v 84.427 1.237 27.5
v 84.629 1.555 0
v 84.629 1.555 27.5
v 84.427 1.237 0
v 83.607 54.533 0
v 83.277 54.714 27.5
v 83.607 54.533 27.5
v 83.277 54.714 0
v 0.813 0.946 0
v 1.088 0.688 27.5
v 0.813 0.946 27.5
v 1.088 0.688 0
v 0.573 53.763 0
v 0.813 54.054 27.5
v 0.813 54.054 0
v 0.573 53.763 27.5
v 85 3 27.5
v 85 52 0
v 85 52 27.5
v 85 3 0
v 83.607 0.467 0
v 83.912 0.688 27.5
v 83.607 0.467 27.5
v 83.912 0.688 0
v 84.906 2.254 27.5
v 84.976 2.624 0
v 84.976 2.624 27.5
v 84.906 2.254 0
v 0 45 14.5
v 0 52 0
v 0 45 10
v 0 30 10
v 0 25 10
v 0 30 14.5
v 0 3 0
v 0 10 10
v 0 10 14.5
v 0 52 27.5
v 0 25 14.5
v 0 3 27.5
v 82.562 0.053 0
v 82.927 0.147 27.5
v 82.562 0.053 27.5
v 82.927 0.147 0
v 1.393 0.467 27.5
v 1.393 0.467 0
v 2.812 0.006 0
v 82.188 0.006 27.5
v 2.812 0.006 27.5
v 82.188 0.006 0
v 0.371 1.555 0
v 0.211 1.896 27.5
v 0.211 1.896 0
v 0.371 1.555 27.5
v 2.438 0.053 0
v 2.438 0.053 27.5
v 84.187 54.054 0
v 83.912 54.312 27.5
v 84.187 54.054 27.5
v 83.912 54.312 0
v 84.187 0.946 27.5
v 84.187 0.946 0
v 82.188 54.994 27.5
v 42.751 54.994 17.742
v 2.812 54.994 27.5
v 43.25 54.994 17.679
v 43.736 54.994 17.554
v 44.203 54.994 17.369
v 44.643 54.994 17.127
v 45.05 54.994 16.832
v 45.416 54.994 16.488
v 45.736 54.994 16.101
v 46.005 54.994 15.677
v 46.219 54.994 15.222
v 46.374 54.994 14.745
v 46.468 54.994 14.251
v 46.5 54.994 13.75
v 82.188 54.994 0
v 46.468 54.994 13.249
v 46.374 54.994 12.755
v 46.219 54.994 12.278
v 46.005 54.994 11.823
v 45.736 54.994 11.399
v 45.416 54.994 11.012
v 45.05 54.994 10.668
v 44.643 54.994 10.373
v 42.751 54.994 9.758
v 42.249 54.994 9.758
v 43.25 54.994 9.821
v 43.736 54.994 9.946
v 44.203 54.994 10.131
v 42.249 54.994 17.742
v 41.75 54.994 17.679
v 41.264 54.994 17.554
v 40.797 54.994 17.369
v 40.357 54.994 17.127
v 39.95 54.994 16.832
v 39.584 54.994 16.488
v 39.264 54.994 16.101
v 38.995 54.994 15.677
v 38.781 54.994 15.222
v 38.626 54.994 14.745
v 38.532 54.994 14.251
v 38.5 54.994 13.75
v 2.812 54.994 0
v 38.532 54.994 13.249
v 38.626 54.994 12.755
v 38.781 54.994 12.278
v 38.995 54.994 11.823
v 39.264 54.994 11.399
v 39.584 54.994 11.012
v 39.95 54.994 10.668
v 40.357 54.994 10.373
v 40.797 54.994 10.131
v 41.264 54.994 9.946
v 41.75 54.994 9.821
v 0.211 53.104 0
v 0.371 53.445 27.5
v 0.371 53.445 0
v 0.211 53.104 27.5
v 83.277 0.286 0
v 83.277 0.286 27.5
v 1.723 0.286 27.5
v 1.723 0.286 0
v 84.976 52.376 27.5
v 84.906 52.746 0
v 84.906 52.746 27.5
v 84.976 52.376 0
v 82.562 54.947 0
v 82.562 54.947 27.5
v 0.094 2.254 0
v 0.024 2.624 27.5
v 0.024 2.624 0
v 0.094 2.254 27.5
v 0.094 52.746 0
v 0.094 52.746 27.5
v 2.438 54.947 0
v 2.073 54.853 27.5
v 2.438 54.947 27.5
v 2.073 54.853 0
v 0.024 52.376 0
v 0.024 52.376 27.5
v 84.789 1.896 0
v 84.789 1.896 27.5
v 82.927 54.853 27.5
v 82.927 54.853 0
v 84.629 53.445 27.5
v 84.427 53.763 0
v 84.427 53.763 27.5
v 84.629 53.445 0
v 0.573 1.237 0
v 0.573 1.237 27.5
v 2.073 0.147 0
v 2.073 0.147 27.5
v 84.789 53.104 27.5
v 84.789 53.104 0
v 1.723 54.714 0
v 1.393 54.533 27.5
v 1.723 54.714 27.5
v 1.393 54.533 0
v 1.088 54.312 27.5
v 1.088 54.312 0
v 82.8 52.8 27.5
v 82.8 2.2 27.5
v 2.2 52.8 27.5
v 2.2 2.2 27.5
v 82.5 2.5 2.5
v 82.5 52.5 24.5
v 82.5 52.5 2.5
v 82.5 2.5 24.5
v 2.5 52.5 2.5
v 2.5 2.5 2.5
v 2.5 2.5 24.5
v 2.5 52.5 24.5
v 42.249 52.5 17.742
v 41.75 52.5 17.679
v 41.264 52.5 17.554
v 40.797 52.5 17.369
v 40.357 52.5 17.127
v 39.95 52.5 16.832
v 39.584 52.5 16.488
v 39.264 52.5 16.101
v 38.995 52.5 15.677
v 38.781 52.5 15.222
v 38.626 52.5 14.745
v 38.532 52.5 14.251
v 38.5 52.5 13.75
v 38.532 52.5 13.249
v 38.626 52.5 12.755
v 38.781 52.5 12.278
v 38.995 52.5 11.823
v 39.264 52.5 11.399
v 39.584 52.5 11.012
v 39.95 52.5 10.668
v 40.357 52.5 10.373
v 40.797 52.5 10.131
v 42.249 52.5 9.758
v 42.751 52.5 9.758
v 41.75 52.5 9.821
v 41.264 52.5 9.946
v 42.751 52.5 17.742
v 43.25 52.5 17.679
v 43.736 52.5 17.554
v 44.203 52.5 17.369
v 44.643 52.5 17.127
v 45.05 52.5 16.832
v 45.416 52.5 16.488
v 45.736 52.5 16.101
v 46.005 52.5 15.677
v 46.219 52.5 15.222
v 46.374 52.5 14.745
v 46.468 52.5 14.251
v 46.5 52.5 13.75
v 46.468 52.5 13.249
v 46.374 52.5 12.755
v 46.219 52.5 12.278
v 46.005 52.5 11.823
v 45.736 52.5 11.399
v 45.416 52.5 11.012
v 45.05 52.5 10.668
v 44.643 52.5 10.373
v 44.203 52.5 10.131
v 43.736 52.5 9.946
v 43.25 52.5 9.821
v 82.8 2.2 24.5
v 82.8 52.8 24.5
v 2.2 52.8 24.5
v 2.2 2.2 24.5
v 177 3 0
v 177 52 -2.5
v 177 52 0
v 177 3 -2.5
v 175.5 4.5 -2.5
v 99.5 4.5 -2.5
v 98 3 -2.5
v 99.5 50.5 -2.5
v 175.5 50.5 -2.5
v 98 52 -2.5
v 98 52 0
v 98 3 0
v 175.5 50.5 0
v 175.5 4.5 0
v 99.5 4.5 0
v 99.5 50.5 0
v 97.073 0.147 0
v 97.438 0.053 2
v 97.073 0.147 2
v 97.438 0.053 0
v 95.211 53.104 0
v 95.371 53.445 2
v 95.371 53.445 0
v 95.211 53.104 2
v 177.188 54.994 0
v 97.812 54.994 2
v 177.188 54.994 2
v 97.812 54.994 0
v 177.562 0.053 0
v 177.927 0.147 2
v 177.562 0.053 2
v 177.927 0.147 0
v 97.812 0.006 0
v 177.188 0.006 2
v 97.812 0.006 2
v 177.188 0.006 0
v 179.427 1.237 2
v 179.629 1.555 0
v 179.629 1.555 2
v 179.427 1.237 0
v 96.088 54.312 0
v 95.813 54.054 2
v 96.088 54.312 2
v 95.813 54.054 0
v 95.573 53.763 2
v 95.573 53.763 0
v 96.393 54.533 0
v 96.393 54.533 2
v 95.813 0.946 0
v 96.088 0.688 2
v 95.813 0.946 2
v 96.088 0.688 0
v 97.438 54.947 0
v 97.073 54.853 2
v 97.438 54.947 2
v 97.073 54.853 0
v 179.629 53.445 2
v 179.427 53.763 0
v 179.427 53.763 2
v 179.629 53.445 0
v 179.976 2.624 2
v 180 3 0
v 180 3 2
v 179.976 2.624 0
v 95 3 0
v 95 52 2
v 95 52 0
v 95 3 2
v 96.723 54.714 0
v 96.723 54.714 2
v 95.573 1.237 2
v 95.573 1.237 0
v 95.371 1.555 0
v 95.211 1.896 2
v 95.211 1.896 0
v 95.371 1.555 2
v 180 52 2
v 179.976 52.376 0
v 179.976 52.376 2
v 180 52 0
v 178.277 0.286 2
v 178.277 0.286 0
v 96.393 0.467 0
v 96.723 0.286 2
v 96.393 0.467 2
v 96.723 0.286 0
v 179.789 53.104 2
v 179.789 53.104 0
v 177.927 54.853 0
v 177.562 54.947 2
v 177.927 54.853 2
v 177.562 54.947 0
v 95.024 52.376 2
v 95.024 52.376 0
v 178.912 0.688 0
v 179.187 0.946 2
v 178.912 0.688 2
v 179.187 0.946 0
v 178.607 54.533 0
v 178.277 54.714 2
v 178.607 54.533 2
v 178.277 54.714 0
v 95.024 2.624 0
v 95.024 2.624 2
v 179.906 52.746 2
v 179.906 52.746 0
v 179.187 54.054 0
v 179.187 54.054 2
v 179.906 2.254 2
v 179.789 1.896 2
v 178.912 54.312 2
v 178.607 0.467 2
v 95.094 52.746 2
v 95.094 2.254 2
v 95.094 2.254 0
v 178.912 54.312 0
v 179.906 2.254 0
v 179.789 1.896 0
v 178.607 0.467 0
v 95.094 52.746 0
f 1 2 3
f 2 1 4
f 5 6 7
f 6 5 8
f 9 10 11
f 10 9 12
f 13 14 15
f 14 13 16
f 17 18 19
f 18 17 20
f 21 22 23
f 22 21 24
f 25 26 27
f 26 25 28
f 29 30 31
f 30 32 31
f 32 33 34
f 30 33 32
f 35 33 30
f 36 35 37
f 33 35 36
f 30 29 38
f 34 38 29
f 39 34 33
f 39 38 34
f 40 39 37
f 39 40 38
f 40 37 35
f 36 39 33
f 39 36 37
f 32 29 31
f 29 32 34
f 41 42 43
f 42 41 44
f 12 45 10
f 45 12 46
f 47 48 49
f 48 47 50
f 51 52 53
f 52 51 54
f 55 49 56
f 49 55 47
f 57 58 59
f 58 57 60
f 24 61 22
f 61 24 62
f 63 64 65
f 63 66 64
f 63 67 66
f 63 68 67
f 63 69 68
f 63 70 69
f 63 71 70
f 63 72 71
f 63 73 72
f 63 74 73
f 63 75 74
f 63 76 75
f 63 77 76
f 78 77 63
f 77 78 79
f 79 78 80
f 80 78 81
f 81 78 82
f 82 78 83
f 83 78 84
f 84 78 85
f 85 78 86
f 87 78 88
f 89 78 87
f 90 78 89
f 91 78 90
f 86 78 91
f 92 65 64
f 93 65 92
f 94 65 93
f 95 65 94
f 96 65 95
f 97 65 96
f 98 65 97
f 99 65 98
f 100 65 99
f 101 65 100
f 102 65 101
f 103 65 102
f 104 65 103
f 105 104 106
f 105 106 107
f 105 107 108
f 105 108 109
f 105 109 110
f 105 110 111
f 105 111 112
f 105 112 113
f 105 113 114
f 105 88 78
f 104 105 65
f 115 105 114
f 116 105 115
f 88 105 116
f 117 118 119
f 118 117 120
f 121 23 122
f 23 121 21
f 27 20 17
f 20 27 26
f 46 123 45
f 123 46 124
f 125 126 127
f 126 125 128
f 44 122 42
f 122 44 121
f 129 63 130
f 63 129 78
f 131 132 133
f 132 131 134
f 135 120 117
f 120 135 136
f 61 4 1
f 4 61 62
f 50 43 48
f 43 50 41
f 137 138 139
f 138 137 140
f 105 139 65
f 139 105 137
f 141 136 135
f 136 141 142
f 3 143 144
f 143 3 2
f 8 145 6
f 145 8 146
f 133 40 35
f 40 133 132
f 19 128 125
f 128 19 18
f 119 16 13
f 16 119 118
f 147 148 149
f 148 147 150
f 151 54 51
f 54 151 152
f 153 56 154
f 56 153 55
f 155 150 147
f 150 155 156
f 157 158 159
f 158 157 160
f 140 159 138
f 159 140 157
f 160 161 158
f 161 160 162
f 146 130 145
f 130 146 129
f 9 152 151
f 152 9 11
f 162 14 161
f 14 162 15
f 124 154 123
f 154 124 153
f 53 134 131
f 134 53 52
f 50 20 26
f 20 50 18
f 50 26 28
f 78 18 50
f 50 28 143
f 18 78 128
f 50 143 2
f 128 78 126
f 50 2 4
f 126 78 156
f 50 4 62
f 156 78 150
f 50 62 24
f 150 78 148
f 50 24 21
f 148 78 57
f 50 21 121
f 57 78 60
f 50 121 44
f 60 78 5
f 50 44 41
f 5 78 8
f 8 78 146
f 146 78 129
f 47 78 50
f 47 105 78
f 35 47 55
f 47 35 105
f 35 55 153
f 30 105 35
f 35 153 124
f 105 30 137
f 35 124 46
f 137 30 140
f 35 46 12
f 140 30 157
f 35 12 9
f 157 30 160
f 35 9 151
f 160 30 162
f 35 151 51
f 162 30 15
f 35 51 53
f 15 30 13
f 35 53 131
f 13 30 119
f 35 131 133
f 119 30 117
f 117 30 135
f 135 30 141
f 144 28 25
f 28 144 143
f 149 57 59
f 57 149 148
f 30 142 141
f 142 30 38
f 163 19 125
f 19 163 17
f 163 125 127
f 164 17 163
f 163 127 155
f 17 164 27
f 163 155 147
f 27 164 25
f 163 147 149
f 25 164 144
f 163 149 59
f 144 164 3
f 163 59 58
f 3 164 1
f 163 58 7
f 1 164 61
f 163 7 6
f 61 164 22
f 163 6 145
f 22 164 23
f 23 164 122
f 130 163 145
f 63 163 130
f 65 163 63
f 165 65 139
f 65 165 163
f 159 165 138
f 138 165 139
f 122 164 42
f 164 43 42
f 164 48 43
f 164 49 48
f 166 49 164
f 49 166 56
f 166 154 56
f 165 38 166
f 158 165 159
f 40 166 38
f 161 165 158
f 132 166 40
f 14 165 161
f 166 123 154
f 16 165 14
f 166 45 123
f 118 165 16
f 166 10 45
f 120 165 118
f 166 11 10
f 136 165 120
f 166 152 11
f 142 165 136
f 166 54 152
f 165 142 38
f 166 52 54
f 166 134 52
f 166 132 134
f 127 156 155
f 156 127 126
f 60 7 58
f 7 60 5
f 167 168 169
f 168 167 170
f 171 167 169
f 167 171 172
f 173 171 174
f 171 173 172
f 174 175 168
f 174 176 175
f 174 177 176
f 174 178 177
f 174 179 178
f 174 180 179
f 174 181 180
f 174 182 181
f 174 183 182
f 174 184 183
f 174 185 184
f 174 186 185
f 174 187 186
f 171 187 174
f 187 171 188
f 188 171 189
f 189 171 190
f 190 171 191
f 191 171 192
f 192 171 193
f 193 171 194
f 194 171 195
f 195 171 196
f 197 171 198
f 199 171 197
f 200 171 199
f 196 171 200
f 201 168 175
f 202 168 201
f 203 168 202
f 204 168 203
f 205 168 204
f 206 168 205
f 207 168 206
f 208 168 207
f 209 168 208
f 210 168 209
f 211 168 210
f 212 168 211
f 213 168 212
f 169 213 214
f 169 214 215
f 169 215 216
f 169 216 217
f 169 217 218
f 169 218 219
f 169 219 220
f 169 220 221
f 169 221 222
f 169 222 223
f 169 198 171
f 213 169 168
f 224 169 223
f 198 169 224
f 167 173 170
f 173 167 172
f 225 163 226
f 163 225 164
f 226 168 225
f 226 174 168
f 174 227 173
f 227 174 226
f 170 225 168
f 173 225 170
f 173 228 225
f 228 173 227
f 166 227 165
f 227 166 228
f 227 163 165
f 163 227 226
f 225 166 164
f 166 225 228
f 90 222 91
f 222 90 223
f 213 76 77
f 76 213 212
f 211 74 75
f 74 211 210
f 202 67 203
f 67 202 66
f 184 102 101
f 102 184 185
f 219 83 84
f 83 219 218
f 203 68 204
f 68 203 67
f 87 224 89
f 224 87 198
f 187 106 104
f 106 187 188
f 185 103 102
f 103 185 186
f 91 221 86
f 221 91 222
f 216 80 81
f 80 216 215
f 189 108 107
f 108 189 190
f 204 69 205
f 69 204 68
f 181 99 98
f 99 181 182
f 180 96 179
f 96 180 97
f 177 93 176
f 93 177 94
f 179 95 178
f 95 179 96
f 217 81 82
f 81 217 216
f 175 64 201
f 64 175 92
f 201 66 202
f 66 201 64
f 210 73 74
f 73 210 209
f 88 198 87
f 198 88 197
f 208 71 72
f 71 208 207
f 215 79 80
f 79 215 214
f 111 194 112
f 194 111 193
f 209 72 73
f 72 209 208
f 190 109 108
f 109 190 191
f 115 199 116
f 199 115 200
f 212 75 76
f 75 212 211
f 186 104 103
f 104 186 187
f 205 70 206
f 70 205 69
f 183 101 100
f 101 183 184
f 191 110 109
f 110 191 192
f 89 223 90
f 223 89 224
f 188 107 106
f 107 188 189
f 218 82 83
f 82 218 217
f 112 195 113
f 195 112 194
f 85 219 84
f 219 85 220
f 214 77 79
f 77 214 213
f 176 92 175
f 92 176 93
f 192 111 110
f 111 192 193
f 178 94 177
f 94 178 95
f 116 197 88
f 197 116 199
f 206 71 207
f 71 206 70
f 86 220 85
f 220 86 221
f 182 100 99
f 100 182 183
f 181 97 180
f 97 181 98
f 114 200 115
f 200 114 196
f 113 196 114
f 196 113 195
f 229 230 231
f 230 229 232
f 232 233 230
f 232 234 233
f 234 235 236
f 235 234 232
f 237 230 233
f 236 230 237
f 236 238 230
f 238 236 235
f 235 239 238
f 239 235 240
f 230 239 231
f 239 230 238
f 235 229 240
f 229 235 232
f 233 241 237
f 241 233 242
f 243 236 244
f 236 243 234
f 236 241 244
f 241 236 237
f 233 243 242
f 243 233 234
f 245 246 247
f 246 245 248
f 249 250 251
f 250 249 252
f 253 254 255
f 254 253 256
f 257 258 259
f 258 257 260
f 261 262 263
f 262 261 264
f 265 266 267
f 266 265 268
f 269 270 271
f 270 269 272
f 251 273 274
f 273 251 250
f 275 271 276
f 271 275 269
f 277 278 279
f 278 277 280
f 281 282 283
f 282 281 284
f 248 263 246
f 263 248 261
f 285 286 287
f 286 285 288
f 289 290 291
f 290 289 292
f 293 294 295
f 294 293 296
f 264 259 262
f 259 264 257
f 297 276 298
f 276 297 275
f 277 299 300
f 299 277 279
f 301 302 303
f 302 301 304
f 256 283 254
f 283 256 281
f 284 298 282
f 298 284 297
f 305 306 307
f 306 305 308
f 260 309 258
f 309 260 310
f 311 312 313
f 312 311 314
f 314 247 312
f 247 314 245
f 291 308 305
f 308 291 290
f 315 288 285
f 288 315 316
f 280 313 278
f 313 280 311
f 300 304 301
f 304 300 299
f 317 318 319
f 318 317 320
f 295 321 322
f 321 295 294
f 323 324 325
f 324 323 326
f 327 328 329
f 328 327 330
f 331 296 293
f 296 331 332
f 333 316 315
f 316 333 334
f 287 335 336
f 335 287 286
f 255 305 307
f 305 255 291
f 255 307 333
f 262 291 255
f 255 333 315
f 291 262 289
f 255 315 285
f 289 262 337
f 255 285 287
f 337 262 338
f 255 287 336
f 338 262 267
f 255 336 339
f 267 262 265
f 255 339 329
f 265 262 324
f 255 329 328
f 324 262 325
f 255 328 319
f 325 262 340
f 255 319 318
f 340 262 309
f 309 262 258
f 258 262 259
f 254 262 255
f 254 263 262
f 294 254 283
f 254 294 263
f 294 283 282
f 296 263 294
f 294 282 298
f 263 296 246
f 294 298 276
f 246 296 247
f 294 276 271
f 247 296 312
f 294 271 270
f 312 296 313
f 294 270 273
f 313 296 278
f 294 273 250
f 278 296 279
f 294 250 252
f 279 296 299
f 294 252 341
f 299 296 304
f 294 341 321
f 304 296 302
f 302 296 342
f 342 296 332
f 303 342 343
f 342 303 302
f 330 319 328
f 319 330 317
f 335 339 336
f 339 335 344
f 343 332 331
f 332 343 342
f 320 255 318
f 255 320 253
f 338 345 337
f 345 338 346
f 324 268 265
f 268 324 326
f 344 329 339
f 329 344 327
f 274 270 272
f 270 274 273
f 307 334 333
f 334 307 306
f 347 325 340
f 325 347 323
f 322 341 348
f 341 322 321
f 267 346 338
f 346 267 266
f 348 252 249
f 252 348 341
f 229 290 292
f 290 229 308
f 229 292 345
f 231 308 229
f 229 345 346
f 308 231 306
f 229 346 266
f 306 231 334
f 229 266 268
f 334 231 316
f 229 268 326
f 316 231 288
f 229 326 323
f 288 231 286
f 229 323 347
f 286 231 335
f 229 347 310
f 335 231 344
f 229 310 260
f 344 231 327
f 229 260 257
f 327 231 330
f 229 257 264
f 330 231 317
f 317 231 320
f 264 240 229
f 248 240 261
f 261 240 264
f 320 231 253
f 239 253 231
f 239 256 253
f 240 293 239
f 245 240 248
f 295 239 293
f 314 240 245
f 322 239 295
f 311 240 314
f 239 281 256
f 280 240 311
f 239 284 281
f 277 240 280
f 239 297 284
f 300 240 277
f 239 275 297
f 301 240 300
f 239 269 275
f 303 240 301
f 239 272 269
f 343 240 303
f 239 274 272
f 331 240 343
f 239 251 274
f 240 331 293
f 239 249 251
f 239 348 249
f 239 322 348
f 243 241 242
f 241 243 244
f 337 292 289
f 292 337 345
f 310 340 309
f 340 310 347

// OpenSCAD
/*
 * Basic Electronics Enclosure Template
 * OpenSCAD Parametric Design
 * 
 * Instructions:
 * 1. Modify parameters in the CONFIGURATION section
 * 2. Preview with F5
 * 3. Render with F6 (takes longer but needed for export)
 * 4. Export STL with File -> Export -> Export as STL
 */

// =============================================================================
// CONFIGURATION - Modify these values
// =============================================================================

// Interior dimensions (mm)
interior_width = 80;
interior_depth = 50;
interior_height = 25;

// Wall parameters
wall_thickness = 2.5;
bottom_thickness = 2.5;
corner_radius = 3;

// Lid parameters
lid_thickness = 2;
lid_tolerance = 0.3;  // Gap for fit
lid_lip_height = 3;

// Quality (higher = smoother, slower)
$fn = 50;

// =============================================================================
// CALCULATED VALUES
// =============================================================================

outer_width = interior_width + 2 * wall_thickness;
outer_depth = interior_depth + 2 * wall_thickness;
outer_height = interior_height + bottom_thickness;

// =============================================================================
// MODULES
// =============================================================================

module rounded_box(w, d, h, r) {
    // Box with rounded vertical edges
    minkowski() {
        cube([w - 2*r, d - 2*r, h/2]);
        cylinder(r=r, h=h/2);
    }
}

module base() {
    difference() {
        // Outer shell
        translate([corner_radius, corner_radius, 0])
            rounded_box(outer_width, outer_depth, outer_height, corner_radius);
        
        // Interior cavity
        translate([wall_thickness, wall_thickness, bottom_thickness])
            cube([interior_width, interior_depth, interior_height + 1]);
        
        // Lid recess
        translate([wall_thickness - lid_tolerance, 
                   wall_thickness - lid_tolerance, 
                   outer_height - lid_lip_height])
            cube([interior_width + 2*lid_tolerance, 
                  interior_depth + 2*lid_tolerance, 
                  lid_lip_height + 1]);
    }
}

module lid() {
    lip_width = interior_width - 1;
    lip_depth = interior_depth - 1;
    
    union() {
        // Top plate
        translate([corner_radius, corner_radius, 0])
            rounded_box(outer_width, outer_depth, lid_thickness, corner_radius);
        
        // Inner lip
        translate([wall_thickness + 0.5, wall_thickness + 0.5, -lid_lip_height + 0.5])
            difference() {
                cube([lip_width, lip_depth, lid_lip_height]);
                translate([1.5, 1.5, -0.1])
                    cube([lip_width - 3, lip_depth - 3, lid_lip_height + 1]);
            }
    }
}

module standoff(x, y, height=5, outer_d=6, inner_d=2.5) {
    // PCB mounting standoff
    translate([wall_thickness + x, wall_thickness + y, bottom_thickness])
        difference() {
            cylinder(d=outer_d, h=height);
            translate([0, 0, -0.1])
                cylinder(d=inner_d, h=height + 1);
        }
}

module vent_slot(x, y, z, length=15, width=2) {
    // Horizontal ventilation slot
    translate([x, y, z])
        hull() {
            cylinder(d=width, h=wall_thickness + 2);
            translate([0, length, 0])
                cylinder(d=width, h=wall_thickness + 2);
        }
}

module cable_hole(x, y, z, diameter=8) {
    // Cable pass-through hole
    translate([x, y, z])
        rotate([90, 0, 0])
            cylinder(d=diameter, h=wall_thickness + 2);
}

// =============================================================================
// ASSEMBLY
// =============================================================================

// Base
difference() {
    base();
    
    // Example: Add ventilation on sides
    // Left side vents
    translate([-1, 0, 0]) {
        vent_slot(0, 10, 10);
        vent_slot(0, 30, 10);
    }
    // Right side vents  
    translate([outer_width - wall_thickness - 1, 0, 0]) {
        vent_slot(0, 10, 10);
        vent_slot(0, 30, 10);
    }
    
    // Example: Cable hole at back
    cable_hole(outer_width/2, outer_depth + 1, outer_height/2);
}

// Example: Add standoffs (customize positions for your PCB)
// standoff(10, 10);
// standoff(10, 40);
// standoff(70, 10);
// standoff(70, 40);

// Lid - offset for printing
translate([outer_width + 10, 0, 0])
    lid();

// =============================================================================
// TIPS
// =============================================================================
/*
 * For STL export, render parts separately:
 * - Comment out the lid, render base, export as "base.stl"
 * - Comment out base, uncomment lid only, export as "lid.stl"
 * 
 * Or use the "!" modifier to render only one part:
 * !base();   <- Only renders base
 * !lid();    <- Only renders lid
 * 
 * Print settings recommendations:
 * - Layer height: 0.2mm
 * - Infill: 20-30%
 * - No supports needed for basic enclosure
 * - Print lid upside down (flat side on bed)
 */
